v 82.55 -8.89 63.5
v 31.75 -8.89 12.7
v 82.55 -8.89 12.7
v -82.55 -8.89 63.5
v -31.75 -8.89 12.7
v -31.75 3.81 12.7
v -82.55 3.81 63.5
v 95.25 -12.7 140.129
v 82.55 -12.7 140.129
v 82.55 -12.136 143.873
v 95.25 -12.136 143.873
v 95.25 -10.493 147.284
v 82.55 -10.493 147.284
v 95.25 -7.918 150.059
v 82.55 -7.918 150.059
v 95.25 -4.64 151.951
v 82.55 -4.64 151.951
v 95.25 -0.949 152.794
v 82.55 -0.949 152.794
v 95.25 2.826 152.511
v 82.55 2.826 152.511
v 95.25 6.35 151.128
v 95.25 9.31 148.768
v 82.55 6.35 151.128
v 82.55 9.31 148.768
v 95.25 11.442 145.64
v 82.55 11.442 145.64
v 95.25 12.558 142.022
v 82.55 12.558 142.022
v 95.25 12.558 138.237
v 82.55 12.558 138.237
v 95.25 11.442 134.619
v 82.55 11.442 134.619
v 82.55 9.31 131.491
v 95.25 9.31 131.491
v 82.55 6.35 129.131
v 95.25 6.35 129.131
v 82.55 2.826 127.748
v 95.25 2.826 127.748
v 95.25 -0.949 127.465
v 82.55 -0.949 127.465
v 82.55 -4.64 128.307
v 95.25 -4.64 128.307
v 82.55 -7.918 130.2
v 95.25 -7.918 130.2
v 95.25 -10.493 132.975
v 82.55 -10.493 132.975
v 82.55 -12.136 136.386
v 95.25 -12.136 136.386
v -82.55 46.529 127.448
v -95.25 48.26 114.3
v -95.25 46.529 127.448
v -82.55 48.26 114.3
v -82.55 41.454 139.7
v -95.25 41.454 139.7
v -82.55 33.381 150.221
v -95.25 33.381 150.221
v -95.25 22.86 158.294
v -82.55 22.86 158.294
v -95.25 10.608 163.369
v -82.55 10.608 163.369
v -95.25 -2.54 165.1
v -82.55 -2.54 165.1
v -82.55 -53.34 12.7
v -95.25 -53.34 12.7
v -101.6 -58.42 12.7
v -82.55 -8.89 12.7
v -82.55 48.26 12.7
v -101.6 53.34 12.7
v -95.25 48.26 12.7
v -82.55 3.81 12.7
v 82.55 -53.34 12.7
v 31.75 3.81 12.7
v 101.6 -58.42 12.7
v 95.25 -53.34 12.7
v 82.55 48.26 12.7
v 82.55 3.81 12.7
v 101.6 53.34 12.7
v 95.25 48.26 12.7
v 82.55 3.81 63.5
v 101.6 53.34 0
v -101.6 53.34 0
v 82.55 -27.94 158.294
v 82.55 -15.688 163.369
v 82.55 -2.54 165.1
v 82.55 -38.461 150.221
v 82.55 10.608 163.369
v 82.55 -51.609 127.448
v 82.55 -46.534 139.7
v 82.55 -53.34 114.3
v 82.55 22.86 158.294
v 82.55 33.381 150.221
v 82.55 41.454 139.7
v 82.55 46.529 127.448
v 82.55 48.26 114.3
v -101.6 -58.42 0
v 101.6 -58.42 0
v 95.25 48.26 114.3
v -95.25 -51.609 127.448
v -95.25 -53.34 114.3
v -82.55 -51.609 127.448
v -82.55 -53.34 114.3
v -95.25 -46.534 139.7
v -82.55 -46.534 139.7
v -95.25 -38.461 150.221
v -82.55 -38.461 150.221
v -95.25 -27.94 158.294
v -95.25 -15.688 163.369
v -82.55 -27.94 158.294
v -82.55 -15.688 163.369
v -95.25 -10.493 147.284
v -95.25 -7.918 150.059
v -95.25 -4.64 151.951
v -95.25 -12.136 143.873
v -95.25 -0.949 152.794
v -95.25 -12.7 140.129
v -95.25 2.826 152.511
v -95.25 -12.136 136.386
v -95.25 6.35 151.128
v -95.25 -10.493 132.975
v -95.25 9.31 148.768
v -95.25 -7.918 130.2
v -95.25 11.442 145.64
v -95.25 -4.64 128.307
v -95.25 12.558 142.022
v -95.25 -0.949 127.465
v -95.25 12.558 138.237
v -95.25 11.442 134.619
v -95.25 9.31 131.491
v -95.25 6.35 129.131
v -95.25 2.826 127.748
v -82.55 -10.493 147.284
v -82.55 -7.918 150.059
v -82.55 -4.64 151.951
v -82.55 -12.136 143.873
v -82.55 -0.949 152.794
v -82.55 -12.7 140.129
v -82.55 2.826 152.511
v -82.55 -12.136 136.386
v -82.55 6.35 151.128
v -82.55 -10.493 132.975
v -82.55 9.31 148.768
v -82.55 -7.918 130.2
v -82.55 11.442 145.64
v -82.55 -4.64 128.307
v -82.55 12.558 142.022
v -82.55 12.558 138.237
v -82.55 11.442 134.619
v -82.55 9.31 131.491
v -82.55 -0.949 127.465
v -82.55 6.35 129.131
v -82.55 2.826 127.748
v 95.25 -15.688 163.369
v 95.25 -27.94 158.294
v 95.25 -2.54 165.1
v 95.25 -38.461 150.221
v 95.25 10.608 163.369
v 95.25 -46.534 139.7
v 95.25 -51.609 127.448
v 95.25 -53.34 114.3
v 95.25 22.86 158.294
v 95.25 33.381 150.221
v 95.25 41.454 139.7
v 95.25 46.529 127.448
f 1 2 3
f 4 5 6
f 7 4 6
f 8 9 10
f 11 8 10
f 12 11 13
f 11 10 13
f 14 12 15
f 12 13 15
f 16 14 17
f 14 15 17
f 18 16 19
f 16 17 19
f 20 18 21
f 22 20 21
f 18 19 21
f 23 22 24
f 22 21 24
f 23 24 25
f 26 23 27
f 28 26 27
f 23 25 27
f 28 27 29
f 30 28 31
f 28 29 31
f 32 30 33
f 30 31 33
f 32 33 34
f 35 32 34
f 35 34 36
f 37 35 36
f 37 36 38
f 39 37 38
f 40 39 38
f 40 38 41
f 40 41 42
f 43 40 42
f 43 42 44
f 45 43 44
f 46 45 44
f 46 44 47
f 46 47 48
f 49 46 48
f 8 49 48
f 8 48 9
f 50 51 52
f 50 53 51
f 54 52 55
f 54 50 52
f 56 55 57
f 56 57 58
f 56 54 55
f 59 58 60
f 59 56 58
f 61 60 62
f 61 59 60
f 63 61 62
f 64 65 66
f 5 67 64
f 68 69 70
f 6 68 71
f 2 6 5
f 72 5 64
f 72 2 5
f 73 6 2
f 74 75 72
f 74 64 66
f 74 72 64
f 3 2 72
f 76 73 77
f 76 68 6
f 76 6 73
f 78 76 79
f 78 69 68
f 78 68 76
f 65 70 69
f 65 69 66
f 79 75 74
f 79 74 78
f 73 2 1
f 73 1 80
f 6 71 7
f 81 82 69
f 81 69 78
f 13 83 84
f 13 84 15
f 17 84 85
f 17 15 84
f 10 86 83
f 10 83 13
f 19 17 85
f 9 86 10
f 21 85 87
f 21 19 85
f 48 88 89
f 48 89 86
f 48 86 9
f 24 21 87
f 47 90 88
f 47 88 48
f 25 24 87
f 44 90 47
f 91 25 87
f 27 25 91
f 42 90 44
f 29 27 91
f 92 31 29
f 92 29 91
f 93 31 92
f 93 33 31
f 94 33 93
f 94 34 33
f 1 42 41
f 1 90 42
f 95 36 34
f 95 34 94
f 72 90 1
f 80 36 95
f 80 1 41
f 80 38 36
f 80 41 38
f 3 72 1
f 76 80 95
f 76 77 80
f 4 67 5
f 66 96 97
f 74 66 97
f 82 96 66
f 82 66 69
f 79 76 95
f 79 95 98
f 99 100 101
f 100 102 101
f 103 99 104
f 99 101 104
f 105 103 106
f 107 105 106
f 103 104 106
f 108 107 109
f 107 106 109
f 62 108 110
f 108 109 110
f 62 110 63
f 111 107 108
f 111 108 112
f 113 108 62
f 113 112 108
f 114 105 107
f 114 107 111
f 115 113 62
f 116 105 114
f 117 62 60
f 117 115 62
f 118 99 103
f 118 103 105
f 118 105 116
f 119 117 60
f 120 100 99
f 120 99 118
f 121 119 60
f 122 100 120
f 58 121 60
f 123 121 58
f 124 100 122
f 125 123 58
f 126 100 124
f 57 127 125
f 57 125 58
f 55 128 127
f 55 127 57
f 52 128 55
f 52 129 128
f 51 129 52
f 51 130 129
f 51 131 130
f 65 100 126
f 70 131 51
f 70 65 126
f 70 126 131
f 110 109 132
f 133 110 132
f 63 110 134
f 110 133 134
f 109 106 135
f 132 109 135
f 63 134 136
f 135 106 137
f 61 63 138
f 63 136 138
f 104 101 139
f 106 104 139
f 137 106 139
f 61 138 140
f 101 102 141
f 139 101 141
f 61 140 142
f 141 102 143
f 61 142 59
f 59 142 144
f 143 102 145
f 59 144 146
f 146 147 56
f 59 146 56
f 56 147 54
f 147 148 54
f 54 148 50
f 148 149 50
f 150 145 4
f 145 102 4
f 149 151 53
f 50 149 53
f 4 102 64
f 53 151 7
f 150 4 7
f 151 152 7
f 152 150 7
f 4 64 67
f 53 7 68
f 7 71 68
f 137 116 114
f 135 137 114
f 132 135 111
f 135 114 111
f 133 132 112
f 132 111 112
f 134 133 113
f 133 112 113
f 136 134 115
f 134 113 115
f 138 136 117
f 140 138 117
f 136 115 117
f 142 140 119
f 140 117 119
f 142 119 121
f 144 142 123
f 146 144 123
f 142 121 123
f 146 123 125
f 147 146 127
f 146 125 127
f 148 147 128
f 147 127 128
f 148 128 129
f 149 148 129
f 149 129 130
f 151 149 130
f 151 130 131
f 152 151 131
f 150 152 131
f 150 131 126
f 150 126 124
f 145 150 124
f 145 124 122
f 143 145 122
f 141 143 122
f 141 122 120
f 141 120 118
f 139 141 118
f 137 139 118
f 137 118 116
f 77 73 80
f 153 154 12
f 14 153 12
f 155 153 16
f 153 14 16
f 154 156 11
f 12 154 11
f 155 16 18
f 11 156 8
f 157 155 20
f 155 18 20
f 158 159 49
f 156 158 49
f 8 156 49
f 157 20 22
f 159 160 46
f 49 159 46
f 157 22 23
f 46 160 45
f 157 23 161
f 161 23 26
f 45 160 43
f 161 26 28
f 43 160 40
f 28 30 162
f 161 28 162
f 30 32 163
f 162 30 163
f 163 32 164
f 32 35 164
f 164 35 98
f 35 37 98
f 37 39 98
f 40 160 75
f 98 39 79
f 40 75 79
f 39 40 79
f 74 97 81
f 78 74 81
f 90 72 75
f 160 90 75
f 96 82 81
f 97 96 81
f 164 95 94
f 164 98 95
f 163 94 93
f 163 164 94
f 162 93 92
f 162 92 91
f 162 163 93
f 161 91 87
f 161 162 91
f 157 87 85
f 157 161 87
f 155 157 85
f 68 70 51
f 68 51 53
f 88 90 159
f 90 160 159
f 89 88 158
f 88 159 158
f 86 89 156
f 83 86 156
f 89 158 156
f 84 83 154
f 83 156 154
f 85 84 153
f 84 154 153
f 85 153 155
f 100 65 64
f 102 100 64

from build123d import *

# Parameters (mm, degrees)
F0_W     = 203.2
F0_H     = 111.76
F1_DEPTH = 12.7
F2_W     = 12.7
F2_H     = 101.6
F3_DEPTH = 152.4
F5_D     = 25.4
F6_R     = 50.79999
F7_R     = 50.79999
F8_W     = 50.8
F8_H     = 12.7
F9_DEPTH = 50.8
F10_SIZE = 50.79999


# Not quite as in the source:
# - a fillet or chamfer is up to 0.001 mm smaller than in the source, because OpenCascade refuses the exact size
# - a feature names something its author has since deleted; it is built from what else it names


with BuildPart() as f1:
    # F0 (on Top) → F1 (new body)
    with BuildSketch(Plane.XY):
        with Locations((0, -2.54)):
            Rectangle(F0_W, F0_H)
    extrude(amount=F1_DEPTH)

    # F2 (on face) → F3 (join)
    with BuildSketch(Plane.XY.offset(12.7)):
        with Locations((-88.9, -2.54)):
            Rectangle(F2_W, F2_H)
        with Locations((88.9, -2.54)):
            Rectangle(F2_W, F2_H)
    extrude(amount=F3_DEPTH)

    # F5 (through all)
    with Locations(Plane.YZ.offset(95.25)):
        with Locations((0, 140.1294022799)):
            Hole(F5_D / 2)

    # F6 (radius 50.8 in the source; OpenCascade refuses exactly that, so slightly less here)
    f6_edges = [f1.edges().sort_by_distance(p)[0] for p in [
        (-88.9, -53.34, 165.1),
        (-88.9, 48.26, 165.1),
    ]]
    fillet(f6_edges, radius=F6_R)

    # F7 (radius 50.8 in the source; OpenCascade refuses exactly that, so slightly less here)
    f7_edges = [f1.edges().sort_by_distance(p)[0] for p in [
        (88.9, -53.34, 165.1),
        (88.9, 48.26, 165.1),
    ]]
    fillet(f7_edges, radius=F7_R)

    # F8 (on face) → F9 (join)
    with BuildSketch(Plane.XY.offset(12.7)):
        with Locations((-57.15, -2.54)):
            Rectangle(F8_W, F8_H)
        with Locations((57.15, -2.54)):
            Rectangle(F8_W, F8_H)
    extrude(amount=F9_DEPTH)

    # F10 (size 50.8 in the source; OpenCascade refuses exactly that, so slightly less here)
    f10_edges = [f1.edges().sort_by_distance(p)[0] for p in [
        (-31.75, -2.54, 63.5),
        (31.75, -2.54, 63.5),
    ]]
    chamfer(f10_edges, length=F10_SIZE)


solid = f1.part
